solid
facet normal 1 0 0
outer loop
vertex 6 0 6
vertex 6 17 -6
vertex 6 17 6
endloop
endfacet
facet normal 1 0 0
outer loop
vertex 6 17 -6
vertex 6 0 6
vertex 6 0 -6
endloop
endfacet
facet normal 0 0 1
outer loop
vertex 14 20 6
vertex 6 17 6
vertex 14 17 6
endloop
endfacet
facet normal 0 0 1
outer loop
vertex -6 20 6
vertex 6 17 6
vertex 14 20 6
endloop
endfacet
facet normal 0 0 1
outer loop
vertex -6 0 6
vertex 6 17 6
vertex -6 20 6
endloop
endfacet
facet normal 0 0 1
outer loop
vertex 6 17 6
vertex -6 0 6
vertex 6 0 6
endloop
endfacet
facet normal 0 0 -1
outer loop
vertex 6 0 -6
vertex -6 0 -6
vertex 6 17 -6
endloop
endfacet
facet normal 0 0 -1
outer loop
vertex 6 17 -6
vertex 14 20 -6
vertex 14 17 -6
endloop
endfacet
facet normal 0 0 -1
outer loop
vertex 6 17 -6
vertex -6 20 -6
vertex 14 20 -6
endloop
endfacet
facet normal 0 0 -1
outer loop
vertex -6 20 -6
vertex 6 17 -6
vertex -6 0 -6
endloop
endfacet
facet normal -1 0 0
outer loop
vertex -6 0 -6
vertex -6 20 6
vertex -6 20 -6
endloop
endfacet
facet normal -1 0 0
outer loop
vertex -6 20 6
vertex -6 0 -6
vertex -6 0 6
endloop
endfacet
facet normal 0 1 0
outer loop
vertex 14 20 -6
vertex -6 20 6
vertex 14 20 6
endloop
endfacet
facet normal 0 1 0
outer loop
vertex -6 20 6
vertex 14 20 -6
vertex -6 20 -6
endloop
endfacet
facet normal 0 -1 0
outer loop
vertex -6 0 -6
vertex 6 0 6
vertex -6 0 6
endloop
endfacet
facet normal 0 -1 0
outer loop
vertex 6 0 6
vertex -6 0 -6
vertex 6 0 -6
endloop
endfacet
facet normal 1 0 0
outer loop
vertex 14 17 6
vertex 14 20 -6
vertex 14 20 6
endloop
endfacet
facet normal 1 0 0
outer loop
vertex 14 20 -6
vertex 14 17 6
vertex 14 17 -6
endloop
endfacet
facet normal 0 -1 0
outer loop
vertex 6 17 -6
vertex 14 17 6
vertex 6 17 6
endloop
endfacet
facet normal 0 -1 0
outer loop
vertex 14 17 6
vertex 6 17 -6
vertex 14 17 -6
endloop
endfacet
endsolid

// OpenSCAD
//
//
//

inner_radius = 24;
outer_radius = 36;
tower_height = 20;
thickness = 3;

walkway_length = 8;

landing_pad_slice_count = 18; // this indirectly controls the size of the pad
landing_pad_slice_sweep = 360 / landing_pad_slice_count;

width = outer_radius - inner_radius;
landing_pad_radius = (width / 2) / sin(landing_pad_slice_sweep / 2);
landing_pad_edge_radius = cos(landing_pad_slice_sweep / 2) * landing_pad_radius;


function bit_set(b, n) = floor(n / pow(2, b)) % 2 > 0;

module make_landing_pad() {
    union() {
        for (rotational_index=[0:1:landing_pad_slice_count-1]) {
            start_angle = (360.0 / landing_pad_slice_count) * rotational_index;
            end_angle = (360.0 / landing_pad_slice_count) * (rotational_index + 1);

            p03x = 0;
            p03y = 0 - thickness;
            p03z = 0;

            p12x = 0;
            p12y = 0;
            p12z = 0;

            p4x = landing_pad_radius * sin(start_angle);
            p4y = 0 - thickness;
            p4z = landing_pad_radius * cos(start_angle);

            p5x = landing_pad_radius * sin(start_angle);
            p5y = 0;
            p5z = landing_pad_radius * cos(start_angle);

            p6x = landing_pad_radius * sin(end_angle);
            p6y = 0;
            p6z = landing_pad_radius * cos(end_angle);

            p7x = landing_pad_radius * sin(end_angle);
            p7y =  0 - thickness;
            p7z = landing_pad_radius * cos(end_angle);

            section_points = [[p03x, p03y, p03z], // 0
                              [p12x, p12y, p12z], // 1
                              [p4x, p4y, p4z], // 2
                              [p5x, p5y, p5z], // 3
                              [p6x, p6y, p6z], // 4
                              [p7x, p7y, p7z]]; // 5
            polyhedron(points=section_points,
                       faces=[[0, 5, 2], // bottom
                              [1, 3, 4], // top
                              [2, 5, 4, 3]]); // outside
        }
    }
}

///////////////////////////////////////////////////////////////////////////////////


nth = 0;  // this is overridden by Makefile

if (nth == 0 || bit_set(0, nth)) {
    translate([-width / 2, 0, -width / 2])
        cube([width, tower_height, width], center = false);
}


if (nth == 0 || bit_set(1, nth)) {
    translate([width / 2, tower_height - thickness, -width / 2])
        cube([walkway_length, thickness, width], center = false);
}


if (nth == 0 || bit_set(2, nth)) {
    translate([landing_pad_edge_radius + width / 2 + walkway_length, tower_height, 0])
        rotate([0, 90 + landing_pad_slice_sweep / 2, 0])
            make_landing_pad();
}
